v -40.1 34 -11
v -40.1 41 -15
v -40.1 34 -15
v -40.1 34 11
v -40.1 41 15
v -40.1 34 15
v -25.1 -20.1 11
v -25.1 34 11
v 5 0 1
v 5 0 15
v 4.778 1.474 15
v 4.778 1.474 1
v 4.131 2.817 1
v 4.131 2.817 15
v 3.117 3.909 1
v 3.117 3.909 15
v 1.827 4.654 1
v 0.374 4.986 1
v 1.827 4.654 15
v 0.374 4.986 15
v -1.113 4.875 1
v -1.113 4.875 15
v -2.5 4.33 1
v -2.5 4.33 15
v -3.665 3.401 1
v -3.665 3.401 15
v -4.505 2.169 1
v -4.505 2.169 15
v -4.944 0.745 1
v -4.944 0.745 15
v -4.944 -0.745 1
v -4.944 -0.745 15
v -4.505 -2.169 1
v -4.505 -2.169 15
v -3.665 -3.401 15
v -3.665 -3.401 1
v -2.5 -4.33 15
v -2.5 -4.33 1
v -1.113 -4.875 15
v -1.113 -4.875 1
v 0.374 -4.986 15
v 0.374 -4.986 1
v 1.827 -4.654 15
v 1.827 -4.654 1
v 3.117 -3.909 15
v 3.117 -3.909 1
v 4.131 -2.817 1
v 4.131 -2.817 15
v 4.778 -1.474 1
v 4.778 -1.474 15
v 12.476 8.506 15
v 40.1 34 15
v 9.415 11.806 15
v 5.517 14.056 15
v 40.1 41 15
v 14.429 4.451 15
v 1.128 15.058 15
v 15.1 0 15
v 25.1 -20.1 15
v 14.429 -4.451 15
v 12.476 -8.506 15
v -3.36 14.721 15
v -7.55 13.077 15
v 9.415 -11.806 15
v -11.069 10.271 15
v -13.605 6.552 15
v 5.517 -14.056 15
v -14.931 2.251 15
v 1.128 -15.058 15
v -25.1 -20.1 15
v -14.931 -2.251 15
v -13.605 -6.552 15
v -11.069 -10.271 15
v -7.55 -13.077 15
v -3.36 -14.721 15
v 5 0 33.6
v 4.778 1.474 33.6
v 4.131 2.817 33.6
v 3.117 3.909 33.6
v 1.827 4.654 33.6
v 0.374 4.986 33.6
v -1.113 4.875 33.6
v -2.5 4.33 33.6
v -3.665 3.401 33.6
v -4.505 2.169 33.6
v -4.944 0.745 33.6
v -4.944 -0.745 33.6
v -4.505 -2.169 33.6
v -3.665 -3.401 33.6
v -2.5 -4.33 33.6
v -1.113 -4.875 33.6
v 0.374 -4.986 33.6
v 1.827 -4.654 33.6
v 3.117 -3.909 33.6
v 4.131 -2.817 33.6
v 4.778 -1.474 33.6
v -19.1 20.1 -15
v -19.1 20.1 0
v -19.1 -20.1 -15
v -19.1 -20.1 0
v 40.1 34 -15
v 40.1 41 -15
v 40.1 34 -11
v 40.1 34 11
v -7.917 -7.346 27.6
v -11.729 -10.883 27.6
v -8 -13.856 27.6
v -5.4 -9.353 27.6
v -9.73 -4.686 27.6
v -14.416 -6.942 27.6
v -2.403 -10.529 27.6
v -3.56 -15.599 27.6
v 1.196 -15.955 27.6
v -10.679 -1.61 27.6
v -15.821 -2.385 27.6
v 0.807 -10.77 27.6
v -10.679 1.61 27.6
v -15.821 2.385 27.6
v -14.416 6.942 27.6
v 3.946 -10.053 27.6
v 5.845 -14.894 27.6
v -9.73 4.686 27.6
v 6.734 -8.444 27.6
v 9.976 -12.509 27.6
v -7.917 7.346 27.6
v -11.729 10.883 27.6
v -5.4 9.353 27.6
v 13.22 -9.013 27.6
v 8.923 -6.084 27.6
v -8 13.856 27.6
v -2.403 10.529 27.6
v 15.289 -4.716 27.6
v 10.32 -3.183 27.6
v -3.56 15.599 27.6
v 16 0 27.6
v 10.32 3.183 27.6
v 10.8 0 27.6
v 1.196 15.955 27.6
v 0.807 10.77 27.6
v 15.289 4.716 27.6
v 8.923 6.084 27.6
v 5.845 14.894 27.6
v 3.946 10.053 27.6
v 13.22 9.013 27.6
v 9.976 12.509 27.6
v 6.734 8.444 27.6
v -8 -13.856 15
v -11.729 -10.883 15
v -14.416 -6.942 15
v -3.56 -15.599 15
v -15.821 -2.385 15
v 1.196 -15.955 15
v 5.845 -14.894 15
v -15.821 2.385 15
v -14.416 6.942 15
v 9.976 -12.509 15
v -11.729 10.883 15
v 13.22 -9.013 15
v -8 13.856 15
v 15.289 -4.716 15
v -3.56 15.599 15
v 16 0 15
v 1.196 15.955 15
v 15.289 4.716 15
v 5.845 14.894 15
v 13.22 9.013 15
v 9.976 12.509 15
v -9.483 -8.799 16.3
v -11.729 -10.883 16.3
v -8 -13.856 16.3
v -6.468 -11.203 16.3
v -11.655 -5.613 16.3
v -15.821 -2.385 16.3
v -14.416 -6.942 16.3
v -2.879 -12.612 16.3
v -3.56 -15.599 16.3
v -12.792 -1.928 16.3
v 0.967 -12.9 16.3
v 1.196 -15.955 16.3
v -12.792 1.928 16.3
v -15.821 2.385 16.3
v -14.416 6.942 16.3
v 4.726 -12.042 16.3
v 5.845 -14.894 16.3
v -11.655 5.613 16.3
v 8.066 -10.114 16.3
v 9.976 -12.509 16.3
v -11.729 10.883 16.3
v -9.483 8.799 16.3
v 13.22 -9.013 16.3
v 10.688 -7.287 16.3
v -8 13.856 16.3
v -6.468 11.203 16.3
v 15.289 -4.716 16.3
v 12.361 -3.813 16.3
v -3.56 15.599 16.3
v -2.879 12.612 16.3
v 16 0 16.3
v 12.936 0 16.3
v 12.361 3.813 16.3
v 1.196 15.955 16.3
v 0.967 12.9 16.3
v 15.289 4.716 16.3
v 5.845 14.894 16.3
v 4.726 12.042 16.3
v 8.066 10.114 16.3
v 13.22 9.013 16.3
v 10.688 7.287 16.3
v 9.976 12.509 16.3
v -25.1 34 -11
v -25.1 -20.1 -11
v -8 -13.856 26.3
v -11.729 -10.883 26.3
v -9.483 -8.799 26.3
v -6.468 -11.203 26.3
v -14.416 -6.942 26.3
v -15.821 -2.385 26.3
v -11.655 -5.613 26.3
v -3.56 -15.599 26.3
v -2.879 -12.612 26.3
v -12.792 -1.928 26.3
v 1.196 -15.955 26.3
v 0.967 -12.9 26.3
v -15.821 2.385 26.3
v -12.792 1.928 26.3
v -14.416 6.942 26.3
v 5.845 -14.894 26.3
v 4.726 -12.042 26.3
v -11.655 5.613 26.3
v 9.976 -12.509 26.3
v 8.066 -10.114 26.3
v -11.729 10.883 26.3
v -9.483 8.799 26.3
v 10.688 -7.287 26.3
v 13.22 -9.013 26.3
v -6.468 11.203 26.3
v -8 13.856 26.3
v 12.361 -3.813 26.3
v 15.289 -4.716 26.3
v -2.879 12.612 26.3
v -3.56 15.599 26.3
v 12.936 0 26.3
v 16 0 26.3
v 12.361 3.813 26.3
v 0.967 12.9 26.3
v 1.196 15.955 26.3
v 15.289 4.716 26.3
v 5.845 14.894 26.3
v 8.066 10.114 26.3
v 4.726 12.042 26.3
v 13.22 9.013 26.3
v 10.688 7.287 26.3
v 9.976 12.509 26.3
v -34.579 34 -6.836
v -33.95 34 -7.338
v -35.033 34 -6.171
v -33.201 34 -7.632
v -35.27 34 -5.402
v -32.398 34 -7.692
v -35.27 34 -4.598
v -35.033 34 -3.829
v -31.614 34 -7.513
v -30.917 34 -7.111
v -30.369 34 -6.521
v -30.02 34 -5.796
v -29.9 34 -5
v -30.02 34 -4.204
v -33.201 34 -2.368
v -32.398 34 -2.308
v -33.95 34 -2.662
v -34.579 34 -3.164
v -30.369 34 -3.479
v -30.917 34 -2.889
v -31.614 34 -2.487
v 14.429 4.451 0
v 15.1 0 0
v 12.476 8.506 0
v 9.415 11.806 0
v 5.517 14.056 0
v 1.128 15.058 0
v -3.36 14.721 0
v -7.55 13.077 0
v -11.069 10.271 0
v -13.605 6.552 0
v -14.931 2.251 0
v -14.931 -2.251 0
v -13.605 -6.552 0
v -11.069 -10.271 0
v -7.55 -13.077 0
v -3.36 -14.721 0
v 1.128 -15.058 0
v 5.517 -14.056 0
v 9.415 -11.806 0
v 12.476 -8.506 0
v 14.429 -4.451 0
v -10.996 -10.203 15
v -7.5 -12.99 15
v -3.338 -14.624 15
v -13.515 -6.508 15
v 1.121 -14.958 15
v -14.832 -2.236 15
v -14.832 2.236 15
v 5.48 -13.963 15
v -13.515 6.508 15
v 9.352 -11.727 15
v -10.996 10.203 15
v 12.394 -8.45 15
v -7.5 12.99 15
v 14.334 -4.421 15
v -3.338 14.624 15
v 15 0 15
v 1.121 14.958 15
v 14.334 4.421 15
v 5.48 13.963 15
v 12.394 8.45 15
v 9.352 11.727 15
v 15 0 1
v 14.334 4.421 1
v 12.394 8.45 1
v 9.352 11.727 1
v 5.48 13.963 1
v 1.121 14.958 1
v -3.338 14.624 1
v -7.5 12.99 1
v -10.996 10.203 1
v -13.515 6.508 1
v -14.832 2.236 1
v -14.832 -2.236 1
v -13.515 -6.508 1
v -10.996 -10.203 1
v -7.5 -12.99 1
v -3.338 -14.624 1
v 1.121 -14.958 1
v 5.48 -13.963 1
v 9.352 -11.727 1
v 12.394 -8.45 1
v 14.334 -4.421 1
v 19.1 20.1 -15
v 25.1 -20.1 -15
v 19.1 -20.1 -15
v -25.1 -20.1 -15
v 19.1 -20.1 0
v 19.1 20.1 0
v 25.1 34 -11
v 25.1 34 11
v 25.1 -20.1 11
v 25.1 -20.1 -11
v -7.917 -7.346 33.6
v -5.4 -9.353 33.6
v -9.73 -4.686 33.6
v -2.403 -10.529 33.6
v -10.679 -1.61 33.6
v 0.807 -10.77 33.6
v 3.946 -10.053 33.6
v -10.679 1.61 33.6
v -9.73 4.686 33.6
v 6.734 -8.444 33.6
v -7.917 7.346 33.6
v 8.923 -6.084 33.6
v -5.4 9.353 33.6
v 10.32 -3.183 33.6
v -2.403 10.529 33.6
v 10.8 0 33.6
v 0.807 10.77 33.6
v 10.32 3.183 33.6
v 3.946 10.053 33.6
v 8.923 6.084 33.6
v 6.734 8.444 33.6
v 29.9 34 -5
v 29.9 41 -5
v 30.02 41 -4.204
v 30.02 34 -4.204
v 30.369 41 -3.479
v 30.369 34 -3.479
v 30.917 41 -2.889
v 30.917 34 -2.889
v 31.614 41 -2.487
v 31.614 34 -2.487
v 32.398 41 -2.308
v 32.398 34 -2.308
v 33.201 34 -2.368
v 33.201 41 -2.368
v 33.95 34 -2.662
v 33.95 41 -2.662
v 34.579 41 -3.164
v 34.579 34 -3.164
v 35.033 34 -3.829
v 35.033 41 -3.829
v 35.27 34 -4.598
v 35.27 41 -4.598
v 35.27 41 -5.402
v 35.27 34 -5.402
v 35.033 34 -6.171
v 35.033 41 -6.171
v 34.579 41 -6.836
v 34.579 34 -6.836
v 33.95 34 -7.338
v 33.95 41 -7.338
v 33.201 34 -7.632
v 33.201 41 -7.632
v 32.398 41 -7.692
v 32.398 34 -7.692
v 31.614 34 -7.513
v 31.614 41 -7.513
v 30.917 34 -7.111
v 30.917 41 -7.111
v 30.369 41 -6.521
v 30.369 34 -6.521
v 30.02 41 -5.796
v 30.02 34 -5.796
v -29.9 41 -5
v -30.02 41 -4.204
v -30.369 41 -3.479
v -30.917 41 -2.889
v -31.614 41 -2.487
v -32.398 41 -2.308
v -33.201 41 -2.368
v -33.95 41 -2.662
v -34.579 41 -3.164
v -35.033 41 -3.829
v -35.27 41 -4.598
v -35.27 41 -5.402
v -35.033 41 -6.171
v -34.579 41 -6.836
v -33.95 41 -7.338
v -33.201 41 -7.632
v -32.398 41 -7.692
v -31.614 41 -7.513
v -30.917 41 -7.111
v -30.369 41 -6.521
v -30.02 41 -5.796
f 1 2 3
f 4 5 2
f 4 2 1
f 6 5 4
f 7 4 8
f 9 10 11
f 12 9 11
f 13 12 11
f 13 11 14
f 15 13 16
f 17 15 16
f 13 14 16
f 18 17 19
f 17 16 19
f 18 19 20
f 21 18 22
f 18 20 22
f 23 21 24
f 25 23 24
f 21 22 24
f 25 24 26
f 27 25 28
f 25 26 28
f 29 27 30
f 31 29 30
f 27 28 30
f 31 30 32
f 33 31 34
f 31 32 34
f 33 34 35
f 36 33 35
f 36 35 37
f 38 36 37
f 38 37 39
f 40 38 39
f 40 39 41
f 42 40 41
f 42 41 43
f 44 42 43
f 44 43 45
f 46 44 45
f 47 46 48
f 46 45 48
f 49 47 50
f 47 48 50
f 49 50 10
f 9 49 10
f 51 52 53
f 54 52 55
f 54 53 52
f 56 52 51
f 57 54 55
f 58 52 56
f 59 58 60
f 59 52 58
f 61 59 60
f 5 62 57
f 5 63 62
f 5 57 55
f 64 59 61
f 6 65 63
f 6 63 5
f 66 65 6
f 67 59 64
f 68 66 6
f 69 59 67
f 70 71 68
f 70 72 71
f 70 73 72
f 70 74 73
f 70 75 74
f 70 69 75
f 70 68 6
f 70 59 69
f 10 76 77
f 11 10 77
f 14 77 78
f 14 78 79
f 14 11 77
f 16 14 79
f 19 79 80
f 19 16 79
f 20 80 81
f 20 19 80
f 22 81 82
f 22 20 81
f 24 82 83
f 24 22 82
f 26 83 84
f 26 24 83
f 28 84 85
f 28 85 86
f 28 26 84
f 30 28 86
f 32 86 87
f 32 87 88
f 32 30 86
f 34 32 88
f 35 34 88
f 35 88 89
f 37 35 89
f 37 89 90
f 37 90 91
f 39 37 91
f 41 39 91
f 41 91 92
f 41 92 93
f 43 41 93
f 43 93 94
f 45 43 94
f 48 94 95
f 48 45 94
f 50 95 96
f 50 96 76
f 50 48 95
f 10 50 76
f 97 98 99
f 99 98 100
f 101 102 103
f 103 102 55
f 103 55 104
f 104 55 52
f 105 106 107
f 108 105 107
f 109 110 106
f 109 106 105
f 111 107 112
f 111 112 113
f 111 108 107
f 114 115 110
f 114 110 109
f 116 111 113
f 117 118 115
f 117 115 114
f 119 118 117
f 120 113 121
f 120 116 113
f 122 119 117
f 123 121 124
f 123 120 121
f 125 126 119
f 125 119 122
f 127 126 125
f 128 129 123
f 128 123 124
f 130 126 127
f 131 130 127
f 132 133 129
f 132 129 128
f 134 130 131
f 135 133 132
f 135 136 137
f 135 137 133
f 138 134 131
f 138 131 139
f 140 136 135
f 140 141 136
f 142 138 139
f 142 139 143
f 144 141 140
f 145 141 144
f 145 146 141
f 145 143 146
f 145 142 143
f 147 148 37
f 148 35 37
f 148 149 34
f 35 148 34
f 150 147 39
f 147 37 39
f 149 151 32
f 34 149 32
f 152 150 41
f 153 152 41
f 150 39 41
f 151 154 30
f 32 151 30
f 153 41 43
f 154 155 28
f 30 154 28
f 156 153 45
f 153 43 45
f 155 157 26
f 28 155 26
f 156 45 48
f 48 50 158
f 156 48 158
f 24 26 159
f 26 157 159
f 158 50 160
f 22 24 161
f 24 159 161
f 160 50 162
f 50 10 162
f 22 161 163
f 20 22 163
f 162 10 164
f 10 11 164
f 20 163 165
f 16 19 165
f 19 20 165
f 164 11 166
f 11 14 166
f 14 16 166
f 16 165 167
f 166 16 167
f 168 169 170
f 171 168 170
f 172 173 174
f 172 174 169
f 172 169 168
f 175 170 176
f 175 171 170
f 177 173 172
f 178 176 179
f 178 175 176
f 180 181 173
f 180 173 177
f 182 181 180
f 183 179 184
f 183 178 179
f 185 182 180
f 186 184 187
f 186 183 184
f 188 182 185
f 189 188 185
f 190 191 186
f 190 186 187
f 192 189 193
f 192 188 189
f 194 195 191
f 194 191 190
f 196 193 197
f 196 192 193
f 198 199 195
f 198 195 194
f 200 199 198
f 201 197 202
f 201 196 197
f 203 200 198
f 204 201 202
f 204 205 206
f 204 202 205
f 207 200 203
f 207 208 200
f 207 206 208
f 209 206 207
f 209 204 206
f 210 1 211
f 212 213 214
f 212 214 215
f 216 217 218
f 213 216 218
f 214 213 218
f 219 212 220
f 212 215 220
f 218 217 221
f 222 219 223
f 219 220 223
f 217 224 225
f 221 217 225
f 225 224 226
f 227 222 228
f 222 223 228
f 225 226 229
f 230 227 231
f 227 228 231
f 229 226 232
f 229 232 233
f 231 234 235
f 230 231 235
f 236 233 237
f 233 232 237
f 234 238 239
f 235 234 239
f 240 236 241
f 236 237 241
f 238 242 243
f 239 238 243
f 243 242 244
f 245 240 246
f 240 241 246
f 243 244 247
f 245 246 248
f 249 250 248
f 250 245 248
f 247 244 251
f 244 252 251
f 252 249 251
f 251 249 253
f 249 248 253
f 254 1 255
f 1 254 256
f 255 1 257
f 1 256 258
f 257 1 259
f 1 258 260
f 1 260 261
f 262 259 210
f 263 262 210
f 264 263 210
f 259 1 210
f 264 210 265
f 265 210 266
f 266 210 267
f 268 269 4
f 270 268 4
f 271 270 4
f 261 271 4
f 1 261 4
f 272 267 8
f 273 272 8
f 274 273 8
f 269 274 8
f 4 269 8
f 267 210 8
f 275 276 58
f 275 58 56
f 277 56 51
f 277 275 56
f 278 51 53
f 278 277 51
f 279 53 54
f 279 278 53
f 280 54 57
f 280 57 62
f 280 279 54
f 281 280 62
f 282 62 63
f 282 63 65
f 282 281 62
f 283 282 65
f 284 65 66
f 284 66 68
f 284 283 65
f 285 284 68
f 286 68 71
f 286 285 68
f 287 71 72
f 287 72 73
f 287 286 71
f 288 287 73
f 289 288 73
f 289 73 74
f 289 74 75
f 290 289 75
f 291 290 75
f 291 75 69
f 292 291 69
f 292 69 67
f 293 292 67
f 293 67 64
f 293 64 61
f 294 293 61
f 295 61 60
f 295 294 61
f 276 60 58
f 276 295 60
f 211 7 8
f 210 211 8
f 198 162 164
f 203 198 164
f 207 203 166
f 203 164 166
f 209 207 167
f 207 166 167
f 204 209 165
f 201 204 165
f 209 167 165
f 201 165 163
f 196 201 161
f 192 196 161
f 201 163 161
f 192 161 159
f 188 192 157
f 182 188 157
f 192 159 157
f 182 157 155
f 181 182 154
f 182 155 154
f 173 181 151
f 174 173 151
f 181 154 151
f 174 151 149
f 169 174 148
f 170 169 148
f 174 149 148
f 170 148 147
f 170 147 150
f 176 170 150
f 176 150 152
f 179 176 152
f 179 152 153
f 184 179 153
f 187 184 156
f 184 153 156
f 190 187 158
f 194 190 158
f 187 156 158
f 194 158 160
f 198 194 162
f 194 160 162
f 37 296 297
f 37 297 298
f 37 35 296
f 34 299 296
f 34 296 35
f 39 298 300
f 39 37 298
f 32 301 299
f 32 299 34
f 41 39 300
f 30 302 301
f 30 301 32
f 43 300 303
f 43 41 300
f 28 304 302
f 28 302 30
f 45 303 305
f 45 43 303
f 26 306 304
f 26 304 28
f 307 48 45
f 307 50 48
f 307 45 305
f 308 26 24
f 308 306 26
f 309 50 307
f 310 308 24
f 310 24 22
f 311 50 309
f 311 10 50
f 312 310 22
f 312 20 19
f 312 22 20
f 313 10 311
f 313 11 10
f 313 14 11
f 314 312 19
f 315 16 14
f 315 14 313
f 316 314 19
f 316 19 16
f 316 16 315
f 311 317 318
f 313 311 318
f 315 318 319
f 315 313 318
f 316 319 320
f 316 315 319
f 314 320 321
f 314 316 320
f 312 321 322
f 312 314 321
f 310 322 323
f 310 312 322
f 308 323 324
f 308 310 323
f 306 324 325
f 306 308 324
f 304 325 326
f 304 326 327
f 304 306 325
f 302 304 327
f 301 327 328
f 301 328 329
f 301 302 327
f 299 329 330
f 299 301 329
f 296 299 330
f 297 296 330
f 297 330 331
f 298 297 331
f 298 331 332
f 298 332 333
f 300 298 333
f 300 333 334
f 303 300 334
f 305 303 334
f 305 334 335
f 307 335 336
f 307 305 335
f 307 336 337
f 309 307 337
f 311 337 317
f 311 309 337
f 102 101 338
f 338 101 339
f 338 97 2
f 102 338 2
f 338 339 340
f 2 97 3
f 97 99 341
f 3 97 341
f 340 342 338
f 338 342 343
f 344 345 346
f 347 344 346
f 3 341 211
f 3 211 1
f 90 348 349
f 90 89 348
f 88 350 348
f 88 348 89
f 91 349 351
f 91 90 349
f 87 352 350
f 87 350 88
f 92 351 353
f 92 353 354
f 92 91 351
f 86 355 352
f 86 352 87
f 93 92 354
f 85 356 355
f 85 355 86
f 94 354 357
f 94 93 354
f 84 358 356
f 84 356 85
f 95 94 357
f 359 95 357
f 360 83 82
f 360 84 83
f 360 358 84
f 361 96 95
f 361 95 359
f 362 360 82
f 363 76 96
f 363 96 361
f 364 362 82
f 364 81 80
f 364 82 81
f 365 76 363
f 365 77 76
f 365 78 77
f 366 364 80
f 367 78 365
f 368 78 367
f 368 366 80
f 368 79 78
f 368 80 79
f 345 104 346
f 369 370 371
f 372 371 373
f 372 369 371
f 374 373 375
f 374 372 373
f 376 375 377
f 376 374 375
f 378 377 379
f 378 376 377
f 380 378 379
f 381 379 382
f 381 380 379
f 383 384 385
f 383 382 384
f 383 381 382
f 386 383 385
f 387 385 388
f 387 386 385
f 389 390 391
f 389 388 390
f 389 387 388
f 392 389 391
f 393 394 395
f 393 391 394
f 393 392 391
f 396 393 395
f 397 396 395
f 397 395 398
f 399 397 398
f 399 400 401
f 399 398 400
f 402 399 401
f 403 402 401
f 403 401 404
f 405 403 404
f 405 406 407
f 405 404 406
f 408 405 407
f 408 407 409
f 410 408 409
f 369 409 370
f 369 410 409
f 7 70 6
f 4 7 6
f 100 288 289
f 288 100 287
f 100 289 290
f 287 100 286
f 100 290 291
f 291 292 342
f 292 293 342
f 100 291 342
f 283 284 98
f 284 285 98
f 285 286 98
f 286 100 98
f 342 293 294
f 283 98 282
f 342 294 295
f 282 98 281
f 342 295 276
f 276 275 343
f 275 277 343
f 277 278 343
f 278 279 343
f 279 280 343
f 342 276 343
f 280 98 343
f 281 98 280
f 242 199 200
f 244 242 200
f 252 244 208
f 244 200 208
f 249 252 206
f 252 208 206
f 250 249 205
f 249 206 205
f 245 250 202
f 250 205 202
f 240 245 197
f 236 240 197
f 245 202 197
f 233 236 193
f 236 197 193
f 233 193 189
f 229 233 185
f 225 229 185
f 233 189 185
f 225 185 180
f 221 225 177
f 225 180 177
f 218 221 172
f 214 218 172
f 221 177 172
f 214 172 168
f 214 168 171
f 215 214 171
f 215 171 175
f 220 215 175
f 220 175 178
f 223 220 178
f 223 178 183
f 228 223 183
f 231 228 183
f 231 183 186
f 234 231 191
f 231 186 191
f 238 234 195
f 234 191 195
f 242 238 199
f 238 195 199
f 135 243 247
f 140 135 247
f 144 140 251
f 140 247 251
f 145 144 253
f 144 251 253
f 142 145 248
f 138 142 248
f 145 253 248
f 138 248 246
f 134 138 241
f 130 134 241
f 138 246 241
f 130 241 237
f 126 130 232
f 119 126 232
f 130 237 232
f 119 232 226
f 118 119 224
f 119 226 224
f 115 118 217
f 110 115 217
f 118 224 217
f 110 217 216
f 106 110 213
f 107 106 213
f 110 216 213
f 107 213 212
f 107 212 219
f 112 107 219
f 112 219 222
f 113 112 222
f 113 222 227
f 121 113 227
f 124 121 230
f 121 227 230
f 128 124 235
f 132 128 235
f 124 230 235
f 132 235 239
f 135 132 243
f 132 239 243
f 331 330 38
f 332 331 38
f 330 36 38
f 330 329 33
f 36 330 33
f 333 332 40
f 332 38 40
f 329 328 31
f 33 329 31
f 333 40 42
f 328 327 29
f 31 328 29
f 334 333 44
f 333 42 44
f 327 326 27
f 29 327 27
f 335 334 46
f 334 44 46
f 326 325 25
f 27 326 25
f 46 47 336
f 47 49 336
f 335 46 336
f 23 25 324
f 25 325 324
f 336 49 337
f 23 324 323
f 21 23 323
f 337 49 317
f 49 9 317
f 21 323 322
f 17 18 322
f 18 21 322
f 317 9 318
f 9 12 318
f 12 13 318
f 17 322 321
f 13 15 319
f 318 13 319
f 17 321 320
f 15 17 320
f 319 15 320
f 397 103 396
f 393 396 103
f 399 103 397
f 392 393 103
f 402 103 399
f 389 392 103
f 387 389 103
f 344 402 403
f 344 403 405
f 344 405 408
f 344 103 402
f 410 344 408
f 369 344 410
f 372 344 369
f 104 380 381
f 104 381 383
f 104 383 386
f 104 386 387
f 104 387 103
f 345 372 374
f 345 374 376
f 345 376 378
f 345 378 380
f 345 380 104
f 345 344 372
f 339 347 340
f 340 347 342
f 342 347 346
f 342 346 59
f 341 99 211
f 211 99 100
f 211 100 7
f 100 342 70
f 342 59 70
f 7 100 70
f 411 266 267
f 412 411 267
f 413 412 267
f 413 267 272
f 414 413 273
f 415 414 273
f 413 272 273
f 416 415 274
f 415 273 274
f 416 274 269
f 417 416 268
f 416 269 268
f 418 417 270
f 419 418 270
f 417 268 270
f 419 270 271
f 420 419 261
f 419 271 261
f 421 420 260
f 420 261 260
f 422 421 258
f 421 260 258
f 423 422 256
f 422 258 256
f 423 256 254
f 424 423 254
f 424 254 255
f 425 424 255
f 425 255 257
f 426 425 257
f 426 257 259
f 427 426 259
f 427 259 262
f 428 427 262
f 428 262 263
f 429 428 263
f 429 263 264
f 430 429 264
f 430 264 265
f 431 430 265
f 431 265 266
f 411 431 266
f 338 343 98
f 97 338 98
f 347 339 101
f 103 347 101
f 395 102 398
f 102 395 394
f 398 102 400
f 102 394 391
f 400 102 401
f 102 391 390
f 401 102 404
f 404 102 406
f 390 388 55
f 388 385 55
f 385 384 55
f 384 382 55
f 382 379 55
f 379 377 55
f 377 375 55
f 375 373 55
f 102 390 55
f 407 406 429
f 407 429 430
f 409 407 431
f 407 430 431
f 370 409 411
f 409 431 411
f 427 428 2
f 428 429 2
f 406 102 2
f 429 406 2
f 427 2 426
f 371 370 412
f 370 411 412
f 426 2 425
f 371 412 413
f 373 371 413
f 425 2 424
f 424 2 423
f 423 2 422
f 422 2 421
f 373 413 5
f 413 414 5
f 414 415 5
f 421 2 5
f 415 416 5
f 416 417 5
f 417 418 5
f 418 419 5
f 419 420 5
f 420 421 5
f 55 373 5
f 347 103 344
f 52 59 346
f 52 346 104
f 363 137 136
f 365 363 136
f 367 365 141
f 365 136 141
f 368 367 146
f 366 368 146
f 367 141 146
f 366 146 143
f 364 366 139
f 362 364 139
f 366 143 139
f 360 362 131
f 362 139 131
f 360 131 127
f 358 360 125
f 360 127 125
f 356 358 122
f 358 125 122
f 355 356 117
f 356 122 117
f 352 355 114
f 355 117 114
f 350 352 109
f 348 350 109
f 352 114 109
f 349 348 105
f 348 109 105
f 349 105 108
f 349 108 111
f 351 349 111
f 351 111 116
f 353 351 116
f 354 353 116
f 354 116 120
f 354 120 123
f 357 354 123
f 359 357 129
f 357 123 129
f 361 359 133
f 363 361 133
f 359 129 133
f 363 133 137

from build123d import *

# Parameters (mm, degrees)
F0_W              = 50.2
F0_H              = 61.1
F0_R              = 15.1
F1_DEPTH          = 15
F2_R              = 15
F2_R_2            = 5
F3_DEPTH          = 14
F5_DEPTH          = 15
F6_W              = 7
F6_H              = 30
F7_DEPTH          = 15
F8_R              = 2.7
F9_DEPTH          = 25
F11_DEPTH         = 4
F11_COPIES2_COUNT = 2
F12_R             = 16
F12_R_2           = 5
F13_DEPTH         = 1.3
F14_R             = 12.9361137745
F14_R_2           = 5
F15_DEPTH         = 10
F16_R             = 16
F16_R_2           = 5
F17_DEPTH         = 1.3
F18_R             = 10.8
F18_R_2           = 5
F19_DEPTH         = 6


# Not quite as in the source:
# - a pattern or mirror of a feature is missing from the dataset's text; its kind, count and spacing are read off the source's solid


with BuildPart() as f1:
    # F0 (on Top) → F1 (new body)
    with BuildSketch(Plane.XY):
        with Locations((0, 10.45)):
            Rectangle(F0_W, F0_H)
        Circle(F0_R, mode=Mode.SUBTRACT)
    extrude(amount=F1_DEPTH)

    # F4 (on face) → F5 (join)
    with BuildSketch(Plane(origin=(0, 0, 0), x_dir=(1, 0, 0), z_dir=(0, 0, -1))):
        Polygon((-25.1, 20.1), (-25.1, -41), (25.1, -41), (25.1, 20.1), (19.1, 20.1), (19.1, -20.1), (-19.1, -20.1), (-19.1, 20.1), align=None)
    extrude(amount=F5_DEPTH)

    # F6 (on face) → F7 (join)
    with BuildSketch(Plane(origin=(-25.1, 0, 0), x_dir=(0, -1, 0), z_dir=(-1, 0, 0))):
        with Locations((-37.5, 0)):
            Rectangle(F6_W, F6_H)
    f7 = extrude(amount=F7_DEPTH)

    # F7_copies: F7 across plane
    add(f7.mirror(Plane(origin=(0, 0, 0), x_dir=(0, 0, 1), z_dir=(1, 0, 0))))

    # F8 (on face) → F9 (cut)
    with BuildSketch(Plane.XZ.offset(-34)):
        with Locations((-32.6, -5)):
            Circle(F8_R)
    f9 = extrude(amount=-F9_DEPTH, mode=Mode.SUBTRACT)

    # F9_copies: F9 across plane
    add(f9.mirror(Plane(origin=(0, 0, 0), x_dir=(0, 0, 1), z_dir=(1, 0, 0))), mode=Mode.SUBTRACT)

    # F10 (on face) → F11 (join)
    with BuildSketch(Plane(origin=(0, 0, -15), x_dir=(1, 0, 0), z_dir=(0, 0, -1))):
        Polygon((-25.1, -34), (-25.1, 20.1), (-40.1, -34), align=None)
    f11 = extrude(amount=-F11_DEPTH)

    # F11_copies: F11 across plane
    add(f11.mirror(Plane.XY))

    # F11_copies1: F11 across plane
    add(f11.mirror(Plane(origin=(0, 0, 0), x_dir=(0, 0, 1), z_dir=(1, 0, 0))))

    # F11_copies2: F11 ×2 about axis
    f11_copies2_axis = Axis((0, 0, 0), (0, 1, 0))
    for i in range(1, F11_COPIES2_COUNT):
        add(f11.rotate(f11_copies2_axis, i * 360 / F11_COPIES2_COUNT))


with BuildPart() as f3:
    # F2 (on face) → F3 (new body)
    with BuildSketch(Plane.XY.offset(15)):
        Circle(F2_R)
        Circle(F2_R_2, mode=Mode.SUBTRACT)
    extrude(amount=-F3_DEPTH)


with BuildPart() as f13:
    # F12 (on face) → F13 (new body)
    with BuildSketch(Plane.XY.offset(15)):
        Circle(F12_R)
        Circle(F12_R_2, mode=Mode.SUBTRACT)
    extrude(amount=F13_DEPTH)

    # F14 (on face) → F15 (join)
    with BuildSketch(Plane.XY.offset(16.3)):
        Circle(F14_R)
        Circle(F14_R_2, mode=Mode.SUBTRACT)
    extrude(amount=F15_DEPTH)

    # F16 (on face) → F17 (join)
    with BuildSketch(Plane.XY.offset(26.3)):
        Circle(F16_R)
        Circle(F16_R_2, mode=Mode.SUBTRACT)
    extrude(amount=F17_DEPTH)

    # F18 (on face) → F19 (join)
    with BuildSketch(Plane.XY.offset(27.6)):
        Circle(F18_R)
        Circle(F18_R_2, mode=Mode.SUBTRACT)
    extrude(amount=F19_DEPTH)


solid = Compound([f1.part, f3.part, f13.part])
